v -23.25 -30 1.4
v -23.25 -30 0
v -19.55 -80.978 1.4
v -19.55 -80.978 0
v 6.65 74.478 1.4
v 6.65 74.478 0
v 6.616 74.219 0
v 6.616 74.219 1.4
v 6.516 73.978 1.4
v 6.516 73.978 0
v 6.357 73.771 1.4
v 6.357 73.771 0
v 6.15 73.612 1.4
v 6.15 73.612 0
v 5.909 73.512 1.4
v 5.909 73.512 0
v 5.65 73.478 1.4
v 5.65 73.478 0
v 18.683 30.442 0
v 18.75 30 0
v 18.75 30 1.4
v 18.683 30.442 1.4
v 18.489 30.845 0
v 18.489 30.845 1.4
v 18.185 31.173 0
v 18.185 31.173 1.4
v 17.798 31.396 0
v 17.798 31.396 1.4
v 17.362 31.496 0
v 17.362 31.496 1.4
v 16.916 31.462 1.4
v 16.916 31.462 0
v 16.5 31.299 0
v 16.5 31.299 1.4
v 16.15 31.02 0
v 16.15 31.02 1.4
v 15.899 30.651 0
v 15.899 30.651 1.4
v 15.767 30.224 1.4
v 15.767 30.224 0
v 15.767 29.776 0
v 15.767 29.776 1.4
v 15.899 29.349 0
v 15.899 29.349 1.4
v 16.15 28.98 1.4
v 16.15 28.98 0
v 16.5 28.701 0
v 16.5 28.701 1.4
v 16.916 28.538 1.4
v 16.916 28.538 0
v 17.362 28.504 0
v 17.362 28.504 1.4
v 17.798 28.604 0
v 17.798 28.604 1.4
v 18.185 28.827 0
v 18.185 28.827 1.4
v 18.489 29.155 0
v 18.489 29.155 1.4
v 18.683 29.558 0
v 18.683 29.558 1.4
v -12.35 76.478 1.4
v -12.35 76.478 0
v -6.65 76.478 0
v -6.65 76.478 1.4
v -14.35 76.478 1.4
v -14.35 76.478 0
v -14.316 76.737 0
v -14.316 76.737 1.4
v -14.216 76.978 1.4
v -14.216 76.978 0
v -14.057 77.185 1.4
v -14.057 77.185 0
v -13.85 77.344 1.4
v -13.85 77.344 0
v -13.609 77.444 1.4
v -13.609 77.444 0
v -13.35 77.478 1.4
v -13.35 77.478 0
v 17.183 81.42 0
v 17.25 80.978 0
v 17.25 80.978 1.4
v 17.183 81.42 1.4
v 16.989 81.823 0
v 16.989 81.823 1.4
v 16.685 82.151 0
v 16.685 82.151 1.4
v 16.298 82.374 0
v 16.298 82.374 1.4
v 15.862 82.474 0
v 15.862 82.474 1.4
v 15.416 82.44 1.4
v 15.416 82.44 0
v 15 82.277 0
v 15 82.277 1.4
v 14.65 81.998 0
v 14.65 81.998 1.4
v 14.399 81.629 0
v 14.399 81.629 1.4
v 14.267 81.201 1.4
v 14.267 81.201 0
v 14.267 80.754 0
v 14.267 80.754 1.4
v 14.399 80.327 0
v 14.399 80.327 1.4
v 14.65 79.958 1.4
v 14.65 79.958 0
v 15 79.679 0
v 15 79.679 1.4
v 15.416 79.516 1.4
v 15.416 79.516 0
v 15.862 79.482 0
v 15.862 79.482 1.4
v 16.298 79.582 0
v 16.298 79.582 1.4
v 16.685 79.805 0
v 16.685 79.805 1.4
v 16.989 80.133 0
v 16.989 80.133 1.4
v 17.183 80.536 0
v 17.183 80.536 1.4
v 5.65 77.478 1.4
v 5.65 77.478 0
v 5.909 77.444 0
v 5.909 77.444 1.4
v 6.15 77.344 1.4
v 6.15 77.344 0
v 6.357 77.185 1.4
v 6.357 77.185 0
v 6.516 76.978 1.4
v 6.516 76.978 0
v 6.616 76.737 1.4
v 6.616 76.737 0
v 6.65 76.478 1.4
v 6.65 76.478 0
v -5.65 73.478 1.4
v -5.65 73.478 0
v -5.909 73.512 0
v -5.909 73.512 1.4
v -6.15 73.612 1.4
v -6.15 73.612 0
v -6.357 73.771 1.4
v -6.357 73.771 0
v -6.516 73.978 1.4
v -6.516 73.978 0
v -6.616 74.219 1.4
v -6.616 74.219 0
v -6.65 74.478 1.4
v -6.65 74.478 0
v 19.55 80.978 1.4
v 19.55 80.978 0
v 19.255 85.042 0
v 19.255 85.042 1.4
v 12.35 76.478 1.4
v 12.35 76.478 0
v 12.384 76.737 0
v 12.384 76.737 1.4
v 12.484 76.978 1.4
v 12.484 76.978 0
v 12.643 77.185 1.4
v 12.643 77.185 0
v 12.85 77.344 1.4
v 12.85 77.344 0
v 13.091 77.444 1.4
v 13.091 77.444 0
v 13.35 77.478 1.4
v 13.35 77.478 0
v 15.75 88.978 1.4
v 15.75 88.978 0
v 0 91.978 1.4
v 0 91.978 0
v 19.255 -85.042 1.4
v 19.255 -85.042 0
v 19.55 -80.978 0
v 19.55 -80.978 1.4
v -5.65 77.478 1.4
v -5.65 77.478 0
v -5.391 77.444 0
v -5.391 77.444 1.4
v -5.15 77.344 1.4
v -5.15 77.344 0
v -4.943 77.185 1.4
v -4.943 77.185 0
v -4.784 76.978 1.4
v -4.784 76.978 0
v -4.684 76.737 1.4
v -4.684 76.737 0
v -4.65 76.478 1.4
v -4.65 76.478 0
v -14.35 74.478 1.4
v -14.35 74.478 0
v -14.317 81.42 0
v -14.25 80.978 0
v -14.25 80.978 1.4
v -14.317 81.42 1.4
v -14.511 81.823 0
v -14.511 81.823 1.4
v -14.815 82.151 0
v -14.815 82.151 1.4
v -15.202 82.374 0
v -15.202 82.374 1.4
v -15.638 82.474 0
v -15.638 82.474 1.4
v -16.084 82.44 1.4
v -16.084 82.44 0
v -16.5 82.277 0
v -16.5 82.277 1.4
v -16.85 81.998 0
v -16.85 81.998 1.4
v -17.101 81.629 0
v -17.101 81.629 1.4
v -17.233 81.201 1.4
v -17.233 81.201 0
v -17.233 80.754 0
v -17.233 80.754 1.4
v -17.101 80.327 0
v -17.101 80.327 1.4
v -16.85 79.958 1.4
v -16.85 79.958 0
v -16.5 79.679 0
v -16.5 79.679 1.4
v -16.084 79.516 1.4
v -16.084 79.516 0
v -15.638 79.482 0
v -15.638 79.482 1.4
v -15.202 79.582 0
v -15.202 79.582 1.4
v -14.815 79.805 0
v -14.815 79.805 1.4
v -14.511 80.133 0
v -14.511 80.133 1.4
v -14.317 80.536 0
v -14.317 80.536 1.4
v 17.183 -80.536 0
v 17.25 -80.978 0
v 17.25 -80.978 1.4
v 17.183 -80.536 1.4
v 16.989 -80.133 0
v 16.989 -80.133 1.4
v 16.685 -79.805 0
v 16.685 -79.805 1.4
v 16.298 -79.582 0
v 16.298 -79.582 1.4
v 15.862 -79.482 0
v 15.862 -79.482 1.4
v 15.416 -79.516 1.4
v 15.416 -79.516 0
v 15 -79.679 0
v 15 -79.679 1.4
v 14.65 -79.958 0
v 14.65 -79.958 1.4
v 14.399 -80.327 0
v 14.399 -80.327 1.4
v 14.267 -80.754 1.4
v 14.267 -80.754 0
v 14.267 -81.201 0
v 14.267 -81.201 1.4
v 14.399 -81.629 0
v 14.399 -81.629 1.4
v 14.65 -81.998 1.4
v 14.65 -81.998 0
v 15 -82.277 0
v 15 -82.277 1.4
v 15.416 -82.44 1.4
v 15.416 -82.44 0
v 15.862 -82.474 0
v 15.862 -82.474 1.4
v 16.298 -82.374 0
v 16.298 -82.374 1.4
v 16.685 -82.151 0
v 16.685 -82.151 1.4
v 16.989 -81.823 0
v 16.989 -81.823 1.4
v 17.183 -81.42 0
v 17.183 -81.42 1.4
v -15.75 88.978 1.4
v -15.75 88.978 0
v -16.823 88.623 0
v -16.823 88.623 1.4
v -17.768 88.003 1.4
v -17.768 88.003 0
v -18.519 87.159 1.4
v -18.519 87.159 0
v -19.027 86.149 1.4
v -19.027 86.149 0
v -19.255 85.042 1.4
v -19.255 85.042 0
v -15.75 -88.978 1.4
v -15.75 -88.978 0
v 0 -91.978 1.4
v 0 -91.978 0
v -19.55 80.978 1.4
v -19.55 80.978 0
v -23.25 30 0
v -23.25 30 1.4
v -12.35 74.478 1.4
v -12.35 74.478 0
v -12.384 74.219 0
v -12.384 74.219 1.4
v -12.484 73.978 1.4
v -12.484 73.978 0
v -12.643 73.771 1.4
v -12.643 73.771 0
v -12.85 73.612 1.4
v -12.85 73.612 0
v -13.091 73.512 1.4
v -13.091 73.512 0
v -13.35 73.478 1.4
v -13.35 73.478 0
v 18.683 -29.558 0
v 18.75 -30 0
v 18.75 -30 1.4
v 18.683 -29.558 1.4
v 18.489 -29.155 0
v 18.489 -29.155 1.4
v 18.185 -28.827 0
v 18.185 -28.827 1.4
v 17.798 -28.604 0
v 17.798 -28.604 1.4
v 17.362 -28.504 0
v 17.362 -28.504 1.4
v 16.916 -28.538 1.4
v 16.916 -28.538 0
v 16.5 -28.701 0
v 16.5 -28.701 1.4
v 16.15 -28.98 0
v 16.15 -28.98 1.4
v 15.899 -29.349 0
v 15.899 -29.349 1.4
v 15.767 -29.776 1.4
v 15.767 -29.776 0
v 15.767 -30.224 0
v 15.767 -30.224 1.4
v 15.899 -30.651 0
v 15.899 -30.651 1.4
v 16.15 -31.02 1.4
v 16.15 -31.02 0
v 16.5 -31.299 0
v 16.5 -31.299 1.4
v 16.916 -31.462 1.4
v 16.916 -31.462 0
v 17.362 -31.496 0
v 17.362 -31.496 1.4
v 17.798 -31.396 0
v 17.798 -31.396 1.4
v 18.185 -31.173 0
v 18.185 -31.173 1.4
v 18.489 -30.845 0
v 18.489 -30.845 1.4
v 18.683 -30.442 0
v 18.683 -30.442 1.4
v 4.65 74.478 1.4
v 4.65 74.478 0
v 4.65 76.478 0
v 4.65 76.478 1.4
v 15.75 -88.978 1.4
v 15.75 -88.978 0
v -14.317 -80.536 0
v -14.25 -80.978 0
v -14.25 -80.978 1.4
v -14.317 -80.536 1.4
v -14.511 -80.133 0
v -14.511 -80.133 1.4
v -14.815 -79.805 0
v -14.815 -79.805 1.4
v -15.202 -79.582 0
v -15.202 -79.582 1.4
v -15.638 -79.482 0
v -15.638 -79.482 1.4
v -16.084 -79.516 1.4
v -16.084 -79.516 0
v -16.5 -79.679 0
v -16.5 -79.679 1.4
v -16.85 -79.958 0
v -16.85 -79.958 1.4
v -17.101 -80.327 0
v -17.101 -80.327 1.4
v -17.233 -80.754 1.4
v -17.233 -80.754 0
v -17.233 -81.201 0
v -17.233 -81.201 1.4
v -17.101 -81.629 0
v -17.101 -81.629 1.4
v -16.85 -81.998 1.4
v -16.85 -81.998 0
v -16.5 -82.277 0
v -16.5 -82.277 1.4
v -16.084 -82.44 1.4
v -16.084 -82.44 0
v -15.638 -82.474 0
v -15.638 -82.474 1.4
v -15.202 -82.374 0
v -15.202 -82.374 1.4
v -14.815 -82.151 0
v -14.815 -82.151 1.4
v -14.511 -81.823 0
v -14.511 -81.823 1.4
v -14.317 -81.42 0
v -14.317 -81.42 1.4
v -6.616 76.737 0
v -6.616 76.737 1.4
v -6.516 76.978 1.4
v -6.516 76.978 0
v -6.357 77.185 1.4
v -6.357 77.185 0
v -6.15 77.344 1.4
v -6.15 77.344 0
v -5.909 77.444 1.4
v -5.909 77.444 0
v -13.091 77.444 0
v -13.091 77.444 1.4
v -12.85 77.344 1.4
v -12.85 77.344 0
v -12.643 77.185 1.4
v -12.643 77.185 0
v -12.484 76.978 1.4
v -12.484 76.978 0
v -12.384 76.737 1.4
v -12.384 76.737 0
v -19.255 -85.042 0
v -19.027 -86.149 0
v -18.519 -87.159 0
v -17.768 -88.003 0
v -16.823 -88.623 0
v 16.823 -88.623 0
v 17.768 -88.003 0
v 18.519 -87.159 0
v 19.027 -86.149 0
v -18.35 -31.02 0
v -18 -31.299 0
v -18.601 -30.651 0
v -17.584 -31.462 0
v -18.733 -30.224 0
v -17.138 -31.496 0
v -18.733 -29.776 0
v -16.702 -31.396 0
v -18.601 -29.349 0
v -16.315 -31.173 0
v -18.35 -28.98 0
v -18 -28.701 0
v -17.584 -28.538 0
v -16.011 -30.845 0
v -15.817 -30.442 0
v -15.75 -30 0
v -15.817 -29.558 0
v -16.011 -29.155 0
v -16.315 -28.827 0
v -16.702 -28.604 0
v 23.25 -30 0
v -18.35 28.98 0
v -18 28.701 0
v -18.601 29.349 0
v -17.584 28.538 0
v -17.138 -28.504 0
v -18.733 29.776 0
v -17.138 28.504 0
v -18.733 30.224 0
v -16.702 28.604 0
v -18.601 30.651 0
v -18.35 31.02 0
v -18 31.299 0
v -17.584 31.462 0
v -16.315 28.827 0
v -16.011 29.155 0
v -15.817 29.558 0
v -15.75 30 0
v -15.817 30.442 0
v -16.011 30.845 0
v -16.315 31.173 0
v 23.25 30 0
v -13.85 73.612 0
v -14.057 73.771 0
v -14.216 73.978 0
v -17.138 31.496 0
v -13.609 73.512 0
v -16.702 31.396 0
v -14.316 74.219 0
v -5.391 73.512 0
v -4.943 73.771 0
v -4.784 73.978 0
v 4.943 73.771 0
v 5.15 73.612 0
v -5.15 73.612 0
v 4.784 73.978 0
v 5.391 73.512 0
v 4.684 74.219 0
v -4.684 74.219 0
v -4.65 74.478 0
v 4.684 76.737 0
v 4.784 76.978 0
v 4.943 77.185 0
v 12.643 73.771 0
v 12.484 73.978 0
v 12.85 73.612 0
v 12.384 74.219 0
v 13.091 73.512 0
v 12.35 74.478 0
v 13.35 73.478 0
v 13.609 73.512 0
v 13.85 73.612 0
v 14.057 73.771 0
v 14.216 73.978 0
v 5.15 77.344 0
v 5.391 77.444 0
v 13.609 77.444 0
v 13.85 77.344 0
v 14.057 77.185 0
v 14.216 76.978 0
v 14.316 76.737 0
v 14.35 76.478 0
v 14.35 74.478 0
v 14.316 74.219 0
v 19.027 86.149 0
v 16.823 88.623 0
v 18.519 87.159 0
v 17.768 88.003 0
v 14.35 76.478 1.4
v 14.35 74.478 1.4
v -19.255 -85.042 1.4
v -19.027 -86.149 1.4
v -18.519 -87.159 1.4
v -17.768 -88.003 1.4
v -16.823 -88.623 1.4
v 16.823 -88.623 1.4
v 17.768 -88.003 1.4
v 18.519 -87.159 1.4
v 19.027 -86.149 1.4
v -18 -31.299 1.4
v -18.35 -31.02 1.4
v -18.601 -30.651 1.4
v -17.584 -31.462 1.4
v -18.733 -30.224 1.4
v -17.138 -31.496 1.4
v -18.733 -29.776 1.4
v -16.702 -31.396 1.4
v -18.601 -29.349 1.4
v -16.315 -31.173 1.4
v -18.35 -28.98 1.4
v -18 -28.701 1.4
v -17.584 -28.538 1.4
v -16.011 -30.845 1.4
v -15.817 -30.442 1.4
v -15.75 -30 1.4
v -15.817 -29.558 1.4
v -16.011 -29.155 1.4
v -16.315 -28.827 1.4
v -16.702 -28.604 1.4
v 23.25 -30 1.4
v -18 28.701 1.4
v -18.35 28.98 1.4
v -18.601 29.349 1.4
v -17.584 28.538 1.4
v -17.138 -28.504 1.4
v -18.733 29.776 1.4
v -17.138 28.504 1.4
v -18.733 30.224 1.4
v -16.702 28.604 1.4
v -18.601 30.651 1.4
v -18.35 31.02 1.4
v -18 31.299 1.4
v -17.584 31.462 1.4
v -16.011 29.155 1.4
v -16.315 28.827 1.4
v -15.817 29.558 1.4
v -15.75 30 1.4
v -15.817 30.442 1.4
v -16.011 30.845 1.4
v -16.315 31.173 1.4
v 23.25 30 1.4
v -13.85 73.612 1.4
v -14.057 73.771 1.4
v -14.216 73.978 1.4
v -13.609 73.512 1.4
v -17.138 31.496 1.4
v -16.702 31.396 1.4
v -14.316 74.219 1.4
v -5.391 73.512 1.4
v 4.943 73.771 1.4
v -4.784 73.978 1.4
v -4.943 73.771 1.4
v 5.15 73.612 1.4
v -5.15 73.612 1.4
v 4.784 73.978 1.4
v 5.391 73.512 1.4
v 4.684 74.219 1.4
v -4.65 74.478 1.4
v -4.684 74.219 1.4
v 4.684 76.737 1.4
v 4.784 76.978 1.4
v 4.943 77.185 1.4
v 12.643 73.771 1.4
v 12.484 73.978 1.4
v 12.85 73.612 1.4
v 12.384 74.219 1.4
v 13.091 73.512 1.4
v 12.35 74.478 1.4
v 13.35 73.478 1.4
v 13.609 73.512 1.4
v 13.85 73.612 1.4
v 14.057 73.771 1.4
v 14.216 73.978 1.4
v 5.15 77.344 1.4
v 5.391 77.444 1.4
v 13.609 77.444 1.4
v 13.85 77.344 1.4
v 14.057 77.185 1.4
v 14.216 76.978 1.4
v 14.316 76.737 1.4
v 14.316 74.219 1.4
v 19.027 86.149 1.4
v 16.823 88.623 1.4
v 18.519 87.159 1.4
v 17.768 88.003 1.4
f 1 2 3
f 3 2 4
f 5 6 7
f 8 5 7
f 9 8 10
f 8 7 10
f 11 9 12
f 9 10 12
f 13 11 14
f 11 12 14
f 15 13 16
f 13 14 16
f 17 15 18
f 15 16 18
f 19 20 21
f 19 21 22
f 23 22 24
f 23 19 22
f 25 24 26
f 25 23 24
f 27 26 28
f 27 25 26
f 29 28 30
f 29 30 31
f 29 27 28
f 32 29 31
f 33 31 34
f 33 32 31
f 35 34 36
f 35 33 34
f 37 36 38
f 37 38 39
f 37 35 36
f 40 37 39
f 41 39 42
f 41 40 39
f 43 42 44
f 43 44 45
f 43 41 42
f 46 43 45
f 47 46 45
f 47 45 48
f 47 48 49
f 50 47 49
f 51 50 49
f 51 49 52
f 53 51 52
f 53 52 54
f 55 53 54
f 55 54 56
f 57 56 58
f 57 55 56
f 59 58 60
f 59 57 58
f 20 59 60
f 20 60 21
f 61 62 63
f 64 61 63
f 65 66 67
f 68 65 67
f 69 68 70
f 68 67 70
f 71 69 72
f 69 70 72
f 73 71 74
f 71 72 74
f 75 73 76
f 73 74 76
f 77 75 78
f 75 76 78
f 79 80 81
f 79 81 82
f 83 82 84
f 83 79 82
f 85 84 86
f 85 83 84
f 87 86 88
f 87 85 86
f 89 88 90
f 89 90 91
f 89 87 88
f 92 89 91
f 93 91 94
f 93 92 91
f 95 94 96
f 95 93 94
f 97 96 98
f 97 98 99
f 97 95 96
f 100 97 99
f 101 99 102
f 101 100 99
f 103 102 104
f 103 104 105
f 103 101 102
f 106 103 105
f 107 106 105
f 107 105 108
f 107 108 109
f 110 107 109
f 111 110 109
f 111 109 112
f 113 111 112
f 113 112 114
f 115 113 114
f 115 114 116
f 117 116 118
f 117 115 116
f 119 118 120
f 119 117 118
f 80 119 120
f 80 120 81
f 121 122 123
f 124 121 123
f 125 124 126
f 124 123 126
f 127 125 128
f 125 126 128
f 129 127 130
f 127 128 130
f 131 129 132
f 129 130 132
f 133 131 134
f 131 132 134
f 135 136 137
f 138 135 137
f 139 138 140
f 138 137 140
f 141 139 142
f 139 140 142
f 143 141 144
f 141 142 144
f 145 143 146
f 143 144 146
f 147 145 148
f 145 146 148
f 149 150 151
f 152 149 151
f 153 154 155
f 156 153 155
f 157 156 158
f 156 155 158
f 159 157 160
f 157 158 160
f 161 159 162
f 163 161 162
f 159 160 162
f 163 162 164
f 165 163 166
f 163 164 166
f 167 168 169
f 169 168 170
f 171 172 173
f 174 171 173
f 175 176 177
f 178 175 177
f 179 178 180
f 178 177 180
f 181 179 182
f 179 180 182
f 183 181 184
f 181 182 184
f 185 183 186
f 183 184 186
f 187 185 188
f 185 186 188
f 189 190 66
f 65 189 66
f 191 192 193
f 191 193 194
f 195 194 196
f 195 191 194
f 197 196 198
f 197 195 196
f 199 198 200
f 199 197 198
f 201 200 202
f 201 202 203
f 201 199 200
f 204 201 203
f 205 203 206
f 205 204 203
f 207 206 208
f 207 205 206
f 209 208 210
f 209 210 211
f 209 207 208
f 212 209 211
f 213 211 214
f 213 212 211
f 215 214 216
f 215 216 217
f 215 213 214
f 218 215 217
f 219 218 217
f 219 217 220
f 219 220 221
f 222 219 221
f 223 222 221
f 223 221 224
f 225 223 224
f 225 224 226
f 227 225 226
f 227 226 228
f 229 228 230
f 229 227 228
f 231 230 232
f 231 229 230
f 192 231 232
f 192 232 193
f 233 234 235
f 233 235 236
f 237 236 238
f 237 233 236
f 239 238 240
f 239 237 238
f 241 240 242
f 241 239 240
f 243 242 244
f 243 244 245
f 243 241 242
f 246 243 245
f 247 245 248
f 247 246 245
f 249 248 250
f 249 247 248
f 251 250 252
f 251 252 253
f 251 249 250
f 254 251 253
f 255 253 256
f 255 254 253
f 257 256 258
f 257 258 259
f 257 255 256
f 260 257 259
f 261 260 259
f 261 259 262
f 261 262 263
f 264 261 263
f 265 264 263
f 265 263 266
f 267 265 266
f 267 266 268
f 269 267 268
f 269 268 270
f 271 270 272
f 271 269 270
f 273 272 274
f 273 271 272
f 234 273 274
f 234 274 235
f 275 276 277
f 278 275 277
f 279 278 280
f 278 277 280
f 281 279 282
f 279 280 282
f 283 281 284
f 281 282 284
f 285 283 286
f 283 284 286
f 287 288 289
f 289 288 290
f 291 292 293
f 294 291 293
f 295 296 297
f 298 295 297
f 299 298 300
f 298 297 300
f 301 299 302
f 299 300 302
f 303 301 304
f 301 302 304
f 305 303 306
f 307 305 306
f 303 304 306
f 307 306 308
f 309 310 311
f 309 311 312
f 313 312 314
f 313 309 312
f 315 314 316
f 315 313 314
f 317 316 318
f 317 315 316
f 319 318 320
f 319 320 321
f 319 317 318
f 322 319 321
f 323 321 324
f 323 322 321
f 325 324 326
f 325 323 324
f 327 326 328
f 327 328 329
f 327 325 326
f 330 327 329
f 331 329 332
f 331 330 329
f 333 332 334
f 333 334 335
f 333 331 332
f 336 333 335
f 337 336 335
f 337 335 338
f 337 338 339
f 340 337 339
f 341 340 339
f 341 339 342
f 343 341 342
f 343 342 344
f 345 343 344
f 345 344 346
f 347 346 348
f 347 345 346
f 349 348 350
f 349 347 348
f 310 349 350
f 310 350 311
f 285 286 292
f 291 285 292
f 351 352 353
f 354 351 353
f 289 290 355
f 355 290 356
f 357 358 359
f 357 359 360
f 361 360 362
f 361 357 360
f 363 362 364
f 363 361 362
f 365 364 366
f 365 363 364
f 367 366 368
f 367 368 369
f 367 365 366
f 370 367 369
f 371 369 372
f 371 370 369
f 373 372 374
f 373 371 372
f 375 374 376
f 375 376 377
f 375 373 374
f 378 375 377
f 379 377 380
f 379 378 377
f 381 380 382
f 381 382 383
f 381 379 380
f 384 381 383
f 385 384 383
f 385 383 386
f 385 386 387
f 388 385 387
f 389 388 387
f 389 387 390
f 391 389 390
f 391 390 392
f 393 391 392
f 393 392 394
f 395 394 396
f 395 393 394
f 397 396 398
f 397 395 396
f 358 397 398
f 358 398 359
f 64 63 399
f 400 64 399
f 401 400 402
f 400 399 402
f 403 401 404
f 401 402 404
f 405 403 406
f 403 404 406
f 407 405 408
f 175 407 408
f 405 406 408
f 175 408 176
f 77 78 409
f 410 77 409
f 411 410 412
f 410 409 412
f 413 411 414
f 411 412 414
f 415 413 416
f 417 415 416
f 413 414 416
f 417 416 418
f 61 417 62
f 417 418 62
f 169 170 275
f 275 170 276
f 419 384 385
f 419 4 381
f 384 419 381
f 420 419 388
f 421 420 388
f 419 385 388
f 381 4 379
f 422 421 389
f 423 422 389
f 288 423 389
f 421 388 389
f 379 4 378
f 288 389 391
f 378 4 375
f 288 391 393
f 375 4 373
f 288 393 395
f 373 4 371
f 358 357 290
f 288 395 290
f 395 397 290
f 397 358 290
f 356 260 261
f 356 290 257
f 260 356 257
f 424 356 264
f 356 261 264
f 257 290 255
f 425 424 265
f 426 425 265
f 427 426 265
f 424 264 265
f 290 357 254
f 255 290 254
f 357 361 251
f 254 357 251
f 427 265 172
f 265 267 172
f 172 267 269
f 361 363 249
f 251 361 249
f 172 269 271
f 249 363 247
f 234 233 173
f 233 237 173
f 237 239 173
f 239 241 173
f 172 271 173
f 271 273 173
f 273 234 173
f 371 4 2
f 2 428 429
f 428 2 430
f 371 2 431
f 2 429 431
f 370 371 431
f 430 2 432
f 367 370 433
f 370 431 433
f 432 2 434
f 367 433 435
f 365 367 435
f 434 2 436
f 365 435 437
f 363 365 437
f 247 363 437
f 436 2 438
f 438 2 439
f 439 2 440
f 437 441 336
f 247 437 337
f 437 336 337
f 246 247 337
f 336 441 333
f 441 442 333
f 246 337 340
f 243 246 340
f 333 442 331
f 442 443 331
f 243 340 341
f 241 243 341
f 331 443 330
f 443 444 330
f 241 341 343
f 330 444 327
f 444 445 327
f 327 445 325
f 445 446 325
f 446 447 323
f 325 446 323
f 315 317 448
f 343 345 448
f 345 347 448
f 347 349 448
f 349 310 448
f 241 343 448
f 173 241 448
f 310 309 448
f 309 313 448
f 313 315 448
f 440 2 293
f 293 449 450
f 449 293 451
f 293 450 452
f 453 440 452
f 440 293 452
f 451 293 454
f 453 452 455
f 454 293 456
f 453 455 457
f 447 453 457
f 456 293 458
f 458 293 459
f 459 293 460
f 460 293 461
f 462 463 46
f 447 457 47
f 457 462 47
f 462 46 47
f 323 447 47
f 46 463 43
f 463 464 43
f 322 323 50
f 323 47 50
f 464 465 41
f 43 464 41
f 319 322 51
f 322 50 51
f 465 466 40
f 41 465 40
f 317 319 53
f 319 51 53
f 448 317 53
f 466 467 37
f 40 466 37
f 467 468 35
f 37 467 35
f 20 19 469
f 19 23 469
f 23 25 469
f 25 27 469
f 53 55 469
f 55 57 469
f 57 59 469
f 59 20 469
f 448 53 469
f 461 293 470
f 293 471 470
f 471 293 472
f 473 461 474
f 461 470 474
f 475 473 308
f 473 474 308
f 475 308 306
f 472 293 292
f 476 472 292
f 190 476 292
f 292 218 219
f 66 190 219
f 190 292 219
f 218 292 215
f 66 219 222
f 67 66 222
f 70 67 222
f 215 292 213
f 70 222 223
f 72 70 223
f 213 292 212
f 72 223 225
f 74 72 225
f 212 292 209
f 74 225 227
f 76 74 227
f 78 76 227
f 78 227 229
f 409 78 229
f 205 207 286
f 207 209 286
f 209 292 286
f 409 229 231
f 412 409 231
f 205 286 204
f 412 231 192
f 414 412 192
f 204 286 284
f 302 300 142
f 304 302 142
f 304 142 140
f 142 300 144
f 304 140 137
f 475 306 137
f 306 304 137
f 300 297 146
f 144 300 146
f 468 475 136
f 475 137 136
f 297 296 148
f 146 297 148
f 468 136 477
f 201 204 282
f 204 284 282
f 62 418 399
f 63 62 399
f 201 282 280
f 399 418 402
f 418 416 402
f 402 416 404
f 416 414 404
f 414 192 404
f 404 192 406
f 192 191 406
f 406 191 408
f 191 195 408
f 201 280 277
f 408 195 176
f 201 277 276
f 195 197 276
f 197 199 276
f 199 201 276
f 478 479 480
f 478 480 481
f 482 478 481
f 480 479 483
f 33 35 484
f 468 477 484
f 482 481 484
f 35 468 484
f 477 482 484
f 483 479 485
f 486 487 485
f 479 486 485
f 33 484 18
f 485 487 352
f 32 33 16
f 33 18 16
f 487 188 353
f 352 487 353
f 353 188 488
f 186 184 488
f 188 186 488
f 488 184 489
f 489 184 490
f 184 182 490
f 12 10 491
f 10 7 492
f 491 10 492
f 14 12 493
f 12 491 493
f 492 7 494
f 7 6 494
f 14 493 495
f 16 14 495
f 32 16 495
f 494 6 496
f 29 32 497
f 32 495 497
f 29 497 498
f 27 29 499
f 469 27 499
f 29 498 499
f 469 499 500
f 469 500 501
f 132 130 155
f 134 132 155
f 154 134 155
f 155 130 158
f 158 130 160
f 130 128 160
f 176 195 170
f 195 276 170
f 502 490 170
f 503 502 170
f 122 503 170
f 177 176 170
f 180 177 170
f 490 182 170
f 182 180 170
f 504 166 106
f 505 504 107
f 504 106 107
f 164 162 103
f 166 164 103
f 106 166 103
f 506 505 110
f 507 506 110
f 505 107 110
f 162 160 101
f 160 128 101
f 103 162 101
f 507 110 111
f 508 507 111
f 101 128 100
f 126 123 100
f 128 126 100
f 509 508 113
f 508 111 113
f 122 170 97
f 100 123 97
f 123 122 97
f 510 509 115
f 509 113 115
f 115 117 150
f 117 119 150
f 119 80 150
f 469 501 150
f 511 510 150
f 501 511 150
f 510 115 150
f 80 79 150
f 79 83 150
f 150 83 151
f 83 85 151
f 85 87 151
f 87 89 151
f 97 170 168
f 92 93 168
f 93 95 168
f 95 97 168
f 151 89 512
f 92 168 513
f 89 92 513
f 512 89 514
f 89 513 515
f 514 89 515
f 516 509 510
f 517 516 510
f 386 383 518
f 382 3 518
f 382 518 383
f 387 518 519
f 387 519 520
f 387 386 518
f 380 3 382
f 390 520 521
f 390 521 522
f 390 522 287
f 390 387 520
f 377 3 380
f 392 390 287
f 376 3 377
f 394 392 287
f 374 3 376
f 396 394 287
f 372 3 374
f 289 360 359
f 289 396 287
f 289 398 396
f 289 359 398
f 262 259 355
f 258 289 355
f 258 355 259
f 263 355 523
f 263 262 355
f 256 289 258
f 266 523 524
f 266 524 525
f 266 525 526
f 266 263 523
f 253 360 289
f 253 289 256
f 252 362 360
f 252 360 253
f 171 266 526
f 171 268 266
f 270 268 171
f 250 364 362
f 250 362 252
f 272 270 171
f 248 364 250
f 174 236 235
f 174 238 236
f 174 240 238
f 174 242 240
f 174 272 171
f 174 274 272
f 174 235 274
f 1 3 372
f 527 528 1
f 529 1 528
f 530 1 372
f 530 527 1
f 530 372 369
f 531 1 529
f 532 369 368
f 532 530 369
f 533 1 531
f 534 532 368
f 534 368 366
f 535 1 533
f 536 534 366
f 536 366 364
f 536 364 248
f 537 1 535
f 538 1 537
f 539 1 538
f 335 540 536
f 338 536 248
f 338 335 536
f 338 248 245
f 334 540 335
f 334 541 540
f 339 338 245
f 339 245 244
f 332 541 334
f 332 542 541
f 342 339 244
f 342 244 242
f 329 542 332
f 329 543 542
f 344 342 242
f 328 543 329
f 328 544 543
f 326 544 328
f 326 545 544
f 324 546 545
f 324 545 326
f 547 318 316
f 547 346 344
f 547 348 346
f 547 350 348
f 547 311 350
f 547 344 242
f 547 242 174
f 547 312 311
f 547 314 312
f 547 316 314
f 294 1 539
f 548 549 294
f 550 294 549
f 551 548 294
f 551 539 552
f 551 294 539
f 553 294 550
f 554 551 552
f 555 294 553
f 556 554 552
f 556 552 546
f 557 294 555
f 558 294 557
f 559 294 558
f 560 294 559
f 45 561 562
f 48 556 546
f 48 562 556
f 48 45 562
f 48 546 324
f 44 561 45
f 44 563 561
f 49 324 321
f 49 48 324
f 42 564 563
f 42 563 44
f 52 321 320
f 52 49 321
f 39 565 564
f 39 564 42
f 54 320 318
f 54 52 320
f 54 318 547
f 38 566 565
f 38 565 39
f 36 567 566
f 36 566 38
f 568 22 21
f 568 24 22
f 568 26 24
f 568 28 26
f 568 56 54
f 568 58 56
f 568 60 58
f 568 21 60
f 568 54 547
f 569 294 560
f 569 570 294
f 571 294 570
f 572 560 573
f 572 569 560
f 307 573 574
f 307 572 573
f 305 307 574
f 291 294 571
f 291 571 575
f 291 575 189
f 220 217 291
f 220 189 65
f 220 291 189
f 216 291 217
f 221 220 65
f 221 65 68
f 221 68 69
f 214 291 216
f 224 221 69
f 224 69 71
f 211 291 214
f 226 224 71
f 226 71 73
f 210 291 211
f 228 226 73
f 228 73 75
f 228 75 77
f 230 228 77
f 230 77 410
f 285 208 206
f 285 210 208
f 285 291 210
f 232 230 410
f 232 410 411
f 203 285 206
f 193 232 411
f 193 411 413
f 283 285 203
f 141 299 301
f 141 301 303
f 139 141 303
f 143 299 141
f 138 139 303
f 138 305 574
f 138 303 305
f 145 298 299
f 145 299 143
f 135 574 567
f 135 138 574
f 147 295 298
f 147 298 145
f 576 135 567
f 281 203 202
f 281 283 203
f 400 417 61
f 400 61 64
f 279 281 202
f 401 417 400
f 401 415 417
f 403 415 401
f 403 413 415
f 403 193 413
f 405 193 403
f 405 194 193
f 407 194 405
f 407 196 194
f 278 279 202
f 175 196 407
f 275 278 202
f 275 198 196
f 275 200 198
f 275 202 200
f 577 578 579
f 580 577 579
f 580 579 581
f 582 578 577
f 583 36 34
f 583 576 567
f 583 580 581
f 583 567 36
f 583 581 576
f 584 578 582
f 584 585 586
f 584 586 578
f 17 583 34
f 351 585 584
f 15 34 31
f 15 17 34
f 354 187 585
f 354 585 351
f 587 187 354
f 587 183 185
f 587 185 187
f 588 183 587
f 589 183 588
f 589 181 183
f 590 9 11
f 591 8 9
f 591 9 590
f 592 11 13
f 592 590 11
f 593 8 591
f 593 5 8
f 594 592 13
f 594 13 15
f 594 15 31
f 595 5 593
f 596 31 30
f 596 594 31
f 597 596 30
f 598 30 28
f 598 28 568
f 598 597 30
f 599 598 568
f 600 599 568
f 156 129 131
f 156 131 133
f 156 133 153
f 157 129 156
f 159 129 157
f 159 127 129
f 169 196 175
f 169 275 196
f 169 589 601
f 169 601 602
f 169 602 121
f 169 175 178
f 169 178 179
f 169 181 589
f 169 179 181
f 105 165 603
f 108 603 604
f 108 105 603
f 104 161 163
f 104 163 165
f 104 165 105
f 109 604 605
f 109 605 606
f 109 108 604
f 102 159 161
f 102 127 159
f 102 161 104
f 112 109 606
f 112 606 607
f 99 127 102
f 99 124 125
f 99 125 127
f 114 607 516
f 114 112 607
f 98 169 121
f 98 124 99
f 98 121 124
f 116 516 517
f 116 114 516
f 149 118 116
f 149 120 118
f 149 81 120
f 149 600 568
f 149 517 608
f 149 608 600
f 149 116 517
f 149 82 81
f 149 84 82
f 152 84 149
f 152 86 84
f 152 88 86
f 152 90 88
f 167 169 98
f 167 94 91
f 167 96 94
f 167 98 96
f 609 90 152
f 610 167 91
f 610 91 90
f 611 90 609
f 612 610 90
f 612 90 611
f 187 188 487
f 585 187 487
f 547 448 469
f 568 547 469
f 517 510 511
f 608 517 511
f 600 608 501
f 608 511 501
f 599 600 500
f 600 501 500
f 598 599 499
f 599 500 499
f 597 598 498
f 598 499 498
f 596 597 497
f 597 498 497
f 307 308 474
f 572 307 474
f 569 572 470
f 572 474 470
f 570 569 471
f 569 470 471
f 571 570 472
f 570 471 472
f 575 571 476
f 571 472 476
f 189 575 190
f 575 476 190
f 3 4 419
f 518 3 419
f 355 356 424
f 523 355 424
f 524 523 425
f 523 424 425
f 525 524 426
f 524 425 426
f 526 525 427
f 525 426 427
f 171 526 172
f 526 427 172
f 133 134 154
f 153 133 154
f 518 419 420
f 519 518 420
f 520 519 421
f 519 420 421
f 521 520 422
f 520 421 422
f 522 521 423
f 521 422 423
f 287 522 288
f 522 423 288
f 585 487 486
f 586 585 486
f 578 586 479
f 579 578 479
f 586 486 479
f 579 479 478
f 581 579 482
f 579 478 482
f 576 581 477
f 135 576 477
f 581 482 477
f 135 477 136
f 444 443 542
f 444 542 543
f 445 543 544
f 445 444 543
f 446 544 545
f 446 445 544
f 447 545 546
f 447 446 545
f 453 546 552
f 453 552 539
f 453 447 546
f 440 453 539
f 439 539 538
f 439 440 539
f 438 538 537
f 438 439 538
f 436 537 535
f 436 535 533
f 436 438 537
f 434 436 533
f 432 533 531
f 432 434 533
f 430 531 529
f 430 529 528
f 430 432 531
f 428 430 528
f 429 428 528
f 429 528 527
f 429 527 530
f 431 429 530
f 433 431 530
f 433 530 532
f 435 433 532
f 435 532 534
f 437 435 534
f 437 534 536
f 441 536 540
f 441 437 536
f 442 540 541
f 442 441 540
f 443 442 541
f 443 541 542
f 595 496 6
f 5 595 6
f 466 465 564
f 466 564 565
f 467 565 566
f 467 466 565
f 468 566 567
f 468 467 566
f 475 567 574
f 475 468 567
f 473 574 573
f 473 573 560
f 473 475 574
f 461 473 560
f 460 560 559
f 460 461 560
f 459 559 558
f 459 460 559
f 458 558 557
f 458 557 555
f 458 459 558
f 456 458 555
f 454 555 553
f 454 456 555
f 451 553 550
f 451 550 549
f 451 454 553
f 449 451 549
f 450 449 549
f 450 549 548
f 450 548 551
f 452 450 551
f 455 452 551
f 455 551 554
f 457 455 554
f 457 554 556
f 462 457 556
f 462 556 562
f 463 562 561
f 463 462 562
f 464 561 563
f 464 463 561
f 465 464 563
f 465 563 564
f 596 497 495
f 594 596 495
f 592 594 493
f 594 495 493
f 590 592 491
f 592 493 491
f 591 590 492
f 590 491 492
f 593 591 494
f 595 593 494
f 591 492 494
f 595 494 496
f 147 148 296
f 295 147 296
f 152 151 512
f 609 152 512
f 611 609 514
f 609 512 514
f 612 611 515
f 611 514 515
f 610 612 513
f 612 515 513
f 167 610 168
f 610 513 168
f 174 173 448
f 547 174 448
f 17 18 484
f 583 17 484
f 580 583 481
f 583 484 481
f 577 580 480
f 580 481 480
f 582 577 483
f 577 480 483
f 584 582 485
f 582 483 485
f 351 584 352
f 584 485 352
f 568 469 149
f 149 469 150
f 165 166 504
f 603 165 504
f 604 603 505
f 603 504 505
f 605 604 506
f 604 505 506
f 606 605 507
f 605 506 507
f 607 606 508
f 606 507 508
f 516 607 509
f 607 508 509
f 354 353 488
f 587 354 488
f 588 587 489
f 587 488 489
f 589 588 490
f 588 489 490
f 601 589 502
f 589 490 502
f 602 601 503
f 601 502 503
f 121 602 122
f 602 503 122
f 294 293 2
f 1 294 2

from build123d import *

# Parameters (mm, degrees)
F0_R     = 1.5
F1_DEPTH = 1.4


with BuildPart() as f1:
    # F0 (on Top) → F1 (new body)
    with BuildSketch(Plane.XY):
        with BuildLine():
            Line((-19.255053, 85.041668), (-19.55, 80.977936))
            Line((-19.55, 80.977936), (-23.25, 30))
            Line((-23.25, 30), (-23.25, 0))
            Line((-23.25, 0), (-23.25, -30))
            Line((-23.25, -30), (-19.55, -80.977936))
            Line((-19.55, -80.977936), (-19.255053, -85.041668))
            ThreePointArc((-19.255053, -85.041668), (-18.171235, -87.605254), (-15.75, -88.977936))
            Line((-15.75, -88.977936), (0, -91.977936))
            Line((0, -91.977936), (15.75, -88.977936))
            ThreePointArc((15.75, -88.977936), (18.171235, -87.605254), (19.255053, -85.041668))
            Line((19.255053, -85.041668), (19.55, -80.977936))
            Line((19.55, -80.977936), (23.25, -30))
            Line((23.25, -30), (23.25, 0))
            Line((23.25, 0), (23.25, 30))
            Line((23.25, 30), (19.55, 80.977936))
            Line((19.55, 80.977936), (19.255053, 85.041668))
            ThreePointArc((19.255053, 85.041668), (18.171235, 87.605254), (15.75, 88.977936))
            Line((15.75, 88.977936), (0, 91.977936))
            Line((0, 91.977936), (-15.75, 88.977936))
            ThreePointArc((-15.75, 88.977936), (-18.171235, 87.605254), (-19.255053, 85.041668))
        make_face()
        with Locations((-15.75, -80.977936)):
            Circle(F0_R, mode=Mode.SUBTRACT)
        with Locations((-17.25, -30)):
            Circle(F0_R, mode=Mode.SUBTRACT)
        with Locations((15.75, -80.977936)):
            Circle(F0_R, mode=Mode.SUBTRACT)
        with Locations((17.25, -30)):
            Circle(F0_R, mode=Mode.SUBTRACT)
        with Locations((-17.25, 30)):
            Circle(F0_R, mode=Mode.SUBTRACT)
        with Locations((-15.75, 80.977936)):
            Circle(F0_R, mode=Mode.SUBTRACT)
        with BuildLine():
            Line((-14.35, 74.477936), (-14.35, 75.477936))
            Line((-14.35, 75.477936), (-14.35, 76.477936))
            ThreePointArc((-14.35, 76.477936), (-14.057107, 77.185043), (-13.35, 77.477936))
            ThreePointArc((-13.35, 77.477936), (-12.642893, 77.185043), (-12.35, 76.477936))
            Line((-12.35, 76.477936), (-9.5, 76.477936))
            Line((-9.5, 76.477936), (-6.65, 76.477936))
            ThreePointArc((-6.65, 76.477936), (-6.357107, 77.185043), (-5.65, 77.477936))
            ThreePointArc((-5.65, 77.477936), (-4.942893, 77.185043), (-4.65, 76.477936))
            Line((-4.65, 76.477936), (-4.65, 75.477936))
            Line((-4.65, 75.477936), (-4.65, 74.477936))
            ThreePointArc((-4.65, 74.477936), (-4.942893, 73.77083), (-5.65, 73.477936))
            ThreePointArc((-5.65, 73.477936), (-6.357107, 73.77083), (-6.65, 74.477936))
            Line((-6.65, 74.477936), (-9.5, 74.477936))
            Line((-9.5, 74.477936), (-12.35, 74.477936))
            ThreePointArc((-12.35, 74.477936), (-12.642893, 73.77083), (-13.35, 73.477936))
            ThreePointArc((-13.35, 73.477936), (-14.057107, 73.77083), (-14.35, 74.477936))
        make_face(mode=Mode.SUBTRACT)
        with Locations((17.25, 30)):
            Circle(F0_R, mode=Mode.SUBTRACT)
        with BuildLine():
            ThreePointArc((13.35, 77.477936), (14.057107, 77.185043), (14.35, 76.477936))
            Line((14.35, 76.477936), (14.35, 75.477936))
            Line((14.35, 75.477936), (14.35, 74.477936))
            ThreePointArc((14.35, 74.477936), (14.057107, 73.77083), (13.35, 73.477936))
            ThreePointArc((13.35, 73.477936), (12.642893, 73.77083), (12.35, 74.477936))
            Line((12.35, 74.477936), (9.5, 74.477936))
            Line((9.5, 74.477936), (6.65, 74.477936))
            ThreePointArc((6.65, 74.477936), (6.357107, 73.77083), (5.65, 73.477936))
            ThreePointArc((5.65, 73.477936), (4.942893, 73.77083), (4.65, 74.477936))
            Line((4.65, 74.477936), (4.65, 75.477936))
            Line((4.65, 75.477936), (4.65, 76.477936))
            ThreePointArc((4.65, 76.477936), (4.942893, 77.185043), (5.65, 77.477936))
            ThreePointArc((5.65, 77.477936), (6.357107, 77.185043), (6.65, 76.477936))
            Line((6.65, 76.477936), (9.5, 76.477936))
            Line((9.5, 76.477936), (12.35, 76.477936))
            ThreePointArc((12.35, 76.477936), (12.642893, 77.185043), (13.35, 77.477936))
        make_face(mode=Mode.SUBTRACT)
        with Locations((15.75, 80.977936)):
            Circle(F0_R, mode=Mode.SUBTRACT)
    extrude(amount=F1_DEPTH)


solid = f1.part
